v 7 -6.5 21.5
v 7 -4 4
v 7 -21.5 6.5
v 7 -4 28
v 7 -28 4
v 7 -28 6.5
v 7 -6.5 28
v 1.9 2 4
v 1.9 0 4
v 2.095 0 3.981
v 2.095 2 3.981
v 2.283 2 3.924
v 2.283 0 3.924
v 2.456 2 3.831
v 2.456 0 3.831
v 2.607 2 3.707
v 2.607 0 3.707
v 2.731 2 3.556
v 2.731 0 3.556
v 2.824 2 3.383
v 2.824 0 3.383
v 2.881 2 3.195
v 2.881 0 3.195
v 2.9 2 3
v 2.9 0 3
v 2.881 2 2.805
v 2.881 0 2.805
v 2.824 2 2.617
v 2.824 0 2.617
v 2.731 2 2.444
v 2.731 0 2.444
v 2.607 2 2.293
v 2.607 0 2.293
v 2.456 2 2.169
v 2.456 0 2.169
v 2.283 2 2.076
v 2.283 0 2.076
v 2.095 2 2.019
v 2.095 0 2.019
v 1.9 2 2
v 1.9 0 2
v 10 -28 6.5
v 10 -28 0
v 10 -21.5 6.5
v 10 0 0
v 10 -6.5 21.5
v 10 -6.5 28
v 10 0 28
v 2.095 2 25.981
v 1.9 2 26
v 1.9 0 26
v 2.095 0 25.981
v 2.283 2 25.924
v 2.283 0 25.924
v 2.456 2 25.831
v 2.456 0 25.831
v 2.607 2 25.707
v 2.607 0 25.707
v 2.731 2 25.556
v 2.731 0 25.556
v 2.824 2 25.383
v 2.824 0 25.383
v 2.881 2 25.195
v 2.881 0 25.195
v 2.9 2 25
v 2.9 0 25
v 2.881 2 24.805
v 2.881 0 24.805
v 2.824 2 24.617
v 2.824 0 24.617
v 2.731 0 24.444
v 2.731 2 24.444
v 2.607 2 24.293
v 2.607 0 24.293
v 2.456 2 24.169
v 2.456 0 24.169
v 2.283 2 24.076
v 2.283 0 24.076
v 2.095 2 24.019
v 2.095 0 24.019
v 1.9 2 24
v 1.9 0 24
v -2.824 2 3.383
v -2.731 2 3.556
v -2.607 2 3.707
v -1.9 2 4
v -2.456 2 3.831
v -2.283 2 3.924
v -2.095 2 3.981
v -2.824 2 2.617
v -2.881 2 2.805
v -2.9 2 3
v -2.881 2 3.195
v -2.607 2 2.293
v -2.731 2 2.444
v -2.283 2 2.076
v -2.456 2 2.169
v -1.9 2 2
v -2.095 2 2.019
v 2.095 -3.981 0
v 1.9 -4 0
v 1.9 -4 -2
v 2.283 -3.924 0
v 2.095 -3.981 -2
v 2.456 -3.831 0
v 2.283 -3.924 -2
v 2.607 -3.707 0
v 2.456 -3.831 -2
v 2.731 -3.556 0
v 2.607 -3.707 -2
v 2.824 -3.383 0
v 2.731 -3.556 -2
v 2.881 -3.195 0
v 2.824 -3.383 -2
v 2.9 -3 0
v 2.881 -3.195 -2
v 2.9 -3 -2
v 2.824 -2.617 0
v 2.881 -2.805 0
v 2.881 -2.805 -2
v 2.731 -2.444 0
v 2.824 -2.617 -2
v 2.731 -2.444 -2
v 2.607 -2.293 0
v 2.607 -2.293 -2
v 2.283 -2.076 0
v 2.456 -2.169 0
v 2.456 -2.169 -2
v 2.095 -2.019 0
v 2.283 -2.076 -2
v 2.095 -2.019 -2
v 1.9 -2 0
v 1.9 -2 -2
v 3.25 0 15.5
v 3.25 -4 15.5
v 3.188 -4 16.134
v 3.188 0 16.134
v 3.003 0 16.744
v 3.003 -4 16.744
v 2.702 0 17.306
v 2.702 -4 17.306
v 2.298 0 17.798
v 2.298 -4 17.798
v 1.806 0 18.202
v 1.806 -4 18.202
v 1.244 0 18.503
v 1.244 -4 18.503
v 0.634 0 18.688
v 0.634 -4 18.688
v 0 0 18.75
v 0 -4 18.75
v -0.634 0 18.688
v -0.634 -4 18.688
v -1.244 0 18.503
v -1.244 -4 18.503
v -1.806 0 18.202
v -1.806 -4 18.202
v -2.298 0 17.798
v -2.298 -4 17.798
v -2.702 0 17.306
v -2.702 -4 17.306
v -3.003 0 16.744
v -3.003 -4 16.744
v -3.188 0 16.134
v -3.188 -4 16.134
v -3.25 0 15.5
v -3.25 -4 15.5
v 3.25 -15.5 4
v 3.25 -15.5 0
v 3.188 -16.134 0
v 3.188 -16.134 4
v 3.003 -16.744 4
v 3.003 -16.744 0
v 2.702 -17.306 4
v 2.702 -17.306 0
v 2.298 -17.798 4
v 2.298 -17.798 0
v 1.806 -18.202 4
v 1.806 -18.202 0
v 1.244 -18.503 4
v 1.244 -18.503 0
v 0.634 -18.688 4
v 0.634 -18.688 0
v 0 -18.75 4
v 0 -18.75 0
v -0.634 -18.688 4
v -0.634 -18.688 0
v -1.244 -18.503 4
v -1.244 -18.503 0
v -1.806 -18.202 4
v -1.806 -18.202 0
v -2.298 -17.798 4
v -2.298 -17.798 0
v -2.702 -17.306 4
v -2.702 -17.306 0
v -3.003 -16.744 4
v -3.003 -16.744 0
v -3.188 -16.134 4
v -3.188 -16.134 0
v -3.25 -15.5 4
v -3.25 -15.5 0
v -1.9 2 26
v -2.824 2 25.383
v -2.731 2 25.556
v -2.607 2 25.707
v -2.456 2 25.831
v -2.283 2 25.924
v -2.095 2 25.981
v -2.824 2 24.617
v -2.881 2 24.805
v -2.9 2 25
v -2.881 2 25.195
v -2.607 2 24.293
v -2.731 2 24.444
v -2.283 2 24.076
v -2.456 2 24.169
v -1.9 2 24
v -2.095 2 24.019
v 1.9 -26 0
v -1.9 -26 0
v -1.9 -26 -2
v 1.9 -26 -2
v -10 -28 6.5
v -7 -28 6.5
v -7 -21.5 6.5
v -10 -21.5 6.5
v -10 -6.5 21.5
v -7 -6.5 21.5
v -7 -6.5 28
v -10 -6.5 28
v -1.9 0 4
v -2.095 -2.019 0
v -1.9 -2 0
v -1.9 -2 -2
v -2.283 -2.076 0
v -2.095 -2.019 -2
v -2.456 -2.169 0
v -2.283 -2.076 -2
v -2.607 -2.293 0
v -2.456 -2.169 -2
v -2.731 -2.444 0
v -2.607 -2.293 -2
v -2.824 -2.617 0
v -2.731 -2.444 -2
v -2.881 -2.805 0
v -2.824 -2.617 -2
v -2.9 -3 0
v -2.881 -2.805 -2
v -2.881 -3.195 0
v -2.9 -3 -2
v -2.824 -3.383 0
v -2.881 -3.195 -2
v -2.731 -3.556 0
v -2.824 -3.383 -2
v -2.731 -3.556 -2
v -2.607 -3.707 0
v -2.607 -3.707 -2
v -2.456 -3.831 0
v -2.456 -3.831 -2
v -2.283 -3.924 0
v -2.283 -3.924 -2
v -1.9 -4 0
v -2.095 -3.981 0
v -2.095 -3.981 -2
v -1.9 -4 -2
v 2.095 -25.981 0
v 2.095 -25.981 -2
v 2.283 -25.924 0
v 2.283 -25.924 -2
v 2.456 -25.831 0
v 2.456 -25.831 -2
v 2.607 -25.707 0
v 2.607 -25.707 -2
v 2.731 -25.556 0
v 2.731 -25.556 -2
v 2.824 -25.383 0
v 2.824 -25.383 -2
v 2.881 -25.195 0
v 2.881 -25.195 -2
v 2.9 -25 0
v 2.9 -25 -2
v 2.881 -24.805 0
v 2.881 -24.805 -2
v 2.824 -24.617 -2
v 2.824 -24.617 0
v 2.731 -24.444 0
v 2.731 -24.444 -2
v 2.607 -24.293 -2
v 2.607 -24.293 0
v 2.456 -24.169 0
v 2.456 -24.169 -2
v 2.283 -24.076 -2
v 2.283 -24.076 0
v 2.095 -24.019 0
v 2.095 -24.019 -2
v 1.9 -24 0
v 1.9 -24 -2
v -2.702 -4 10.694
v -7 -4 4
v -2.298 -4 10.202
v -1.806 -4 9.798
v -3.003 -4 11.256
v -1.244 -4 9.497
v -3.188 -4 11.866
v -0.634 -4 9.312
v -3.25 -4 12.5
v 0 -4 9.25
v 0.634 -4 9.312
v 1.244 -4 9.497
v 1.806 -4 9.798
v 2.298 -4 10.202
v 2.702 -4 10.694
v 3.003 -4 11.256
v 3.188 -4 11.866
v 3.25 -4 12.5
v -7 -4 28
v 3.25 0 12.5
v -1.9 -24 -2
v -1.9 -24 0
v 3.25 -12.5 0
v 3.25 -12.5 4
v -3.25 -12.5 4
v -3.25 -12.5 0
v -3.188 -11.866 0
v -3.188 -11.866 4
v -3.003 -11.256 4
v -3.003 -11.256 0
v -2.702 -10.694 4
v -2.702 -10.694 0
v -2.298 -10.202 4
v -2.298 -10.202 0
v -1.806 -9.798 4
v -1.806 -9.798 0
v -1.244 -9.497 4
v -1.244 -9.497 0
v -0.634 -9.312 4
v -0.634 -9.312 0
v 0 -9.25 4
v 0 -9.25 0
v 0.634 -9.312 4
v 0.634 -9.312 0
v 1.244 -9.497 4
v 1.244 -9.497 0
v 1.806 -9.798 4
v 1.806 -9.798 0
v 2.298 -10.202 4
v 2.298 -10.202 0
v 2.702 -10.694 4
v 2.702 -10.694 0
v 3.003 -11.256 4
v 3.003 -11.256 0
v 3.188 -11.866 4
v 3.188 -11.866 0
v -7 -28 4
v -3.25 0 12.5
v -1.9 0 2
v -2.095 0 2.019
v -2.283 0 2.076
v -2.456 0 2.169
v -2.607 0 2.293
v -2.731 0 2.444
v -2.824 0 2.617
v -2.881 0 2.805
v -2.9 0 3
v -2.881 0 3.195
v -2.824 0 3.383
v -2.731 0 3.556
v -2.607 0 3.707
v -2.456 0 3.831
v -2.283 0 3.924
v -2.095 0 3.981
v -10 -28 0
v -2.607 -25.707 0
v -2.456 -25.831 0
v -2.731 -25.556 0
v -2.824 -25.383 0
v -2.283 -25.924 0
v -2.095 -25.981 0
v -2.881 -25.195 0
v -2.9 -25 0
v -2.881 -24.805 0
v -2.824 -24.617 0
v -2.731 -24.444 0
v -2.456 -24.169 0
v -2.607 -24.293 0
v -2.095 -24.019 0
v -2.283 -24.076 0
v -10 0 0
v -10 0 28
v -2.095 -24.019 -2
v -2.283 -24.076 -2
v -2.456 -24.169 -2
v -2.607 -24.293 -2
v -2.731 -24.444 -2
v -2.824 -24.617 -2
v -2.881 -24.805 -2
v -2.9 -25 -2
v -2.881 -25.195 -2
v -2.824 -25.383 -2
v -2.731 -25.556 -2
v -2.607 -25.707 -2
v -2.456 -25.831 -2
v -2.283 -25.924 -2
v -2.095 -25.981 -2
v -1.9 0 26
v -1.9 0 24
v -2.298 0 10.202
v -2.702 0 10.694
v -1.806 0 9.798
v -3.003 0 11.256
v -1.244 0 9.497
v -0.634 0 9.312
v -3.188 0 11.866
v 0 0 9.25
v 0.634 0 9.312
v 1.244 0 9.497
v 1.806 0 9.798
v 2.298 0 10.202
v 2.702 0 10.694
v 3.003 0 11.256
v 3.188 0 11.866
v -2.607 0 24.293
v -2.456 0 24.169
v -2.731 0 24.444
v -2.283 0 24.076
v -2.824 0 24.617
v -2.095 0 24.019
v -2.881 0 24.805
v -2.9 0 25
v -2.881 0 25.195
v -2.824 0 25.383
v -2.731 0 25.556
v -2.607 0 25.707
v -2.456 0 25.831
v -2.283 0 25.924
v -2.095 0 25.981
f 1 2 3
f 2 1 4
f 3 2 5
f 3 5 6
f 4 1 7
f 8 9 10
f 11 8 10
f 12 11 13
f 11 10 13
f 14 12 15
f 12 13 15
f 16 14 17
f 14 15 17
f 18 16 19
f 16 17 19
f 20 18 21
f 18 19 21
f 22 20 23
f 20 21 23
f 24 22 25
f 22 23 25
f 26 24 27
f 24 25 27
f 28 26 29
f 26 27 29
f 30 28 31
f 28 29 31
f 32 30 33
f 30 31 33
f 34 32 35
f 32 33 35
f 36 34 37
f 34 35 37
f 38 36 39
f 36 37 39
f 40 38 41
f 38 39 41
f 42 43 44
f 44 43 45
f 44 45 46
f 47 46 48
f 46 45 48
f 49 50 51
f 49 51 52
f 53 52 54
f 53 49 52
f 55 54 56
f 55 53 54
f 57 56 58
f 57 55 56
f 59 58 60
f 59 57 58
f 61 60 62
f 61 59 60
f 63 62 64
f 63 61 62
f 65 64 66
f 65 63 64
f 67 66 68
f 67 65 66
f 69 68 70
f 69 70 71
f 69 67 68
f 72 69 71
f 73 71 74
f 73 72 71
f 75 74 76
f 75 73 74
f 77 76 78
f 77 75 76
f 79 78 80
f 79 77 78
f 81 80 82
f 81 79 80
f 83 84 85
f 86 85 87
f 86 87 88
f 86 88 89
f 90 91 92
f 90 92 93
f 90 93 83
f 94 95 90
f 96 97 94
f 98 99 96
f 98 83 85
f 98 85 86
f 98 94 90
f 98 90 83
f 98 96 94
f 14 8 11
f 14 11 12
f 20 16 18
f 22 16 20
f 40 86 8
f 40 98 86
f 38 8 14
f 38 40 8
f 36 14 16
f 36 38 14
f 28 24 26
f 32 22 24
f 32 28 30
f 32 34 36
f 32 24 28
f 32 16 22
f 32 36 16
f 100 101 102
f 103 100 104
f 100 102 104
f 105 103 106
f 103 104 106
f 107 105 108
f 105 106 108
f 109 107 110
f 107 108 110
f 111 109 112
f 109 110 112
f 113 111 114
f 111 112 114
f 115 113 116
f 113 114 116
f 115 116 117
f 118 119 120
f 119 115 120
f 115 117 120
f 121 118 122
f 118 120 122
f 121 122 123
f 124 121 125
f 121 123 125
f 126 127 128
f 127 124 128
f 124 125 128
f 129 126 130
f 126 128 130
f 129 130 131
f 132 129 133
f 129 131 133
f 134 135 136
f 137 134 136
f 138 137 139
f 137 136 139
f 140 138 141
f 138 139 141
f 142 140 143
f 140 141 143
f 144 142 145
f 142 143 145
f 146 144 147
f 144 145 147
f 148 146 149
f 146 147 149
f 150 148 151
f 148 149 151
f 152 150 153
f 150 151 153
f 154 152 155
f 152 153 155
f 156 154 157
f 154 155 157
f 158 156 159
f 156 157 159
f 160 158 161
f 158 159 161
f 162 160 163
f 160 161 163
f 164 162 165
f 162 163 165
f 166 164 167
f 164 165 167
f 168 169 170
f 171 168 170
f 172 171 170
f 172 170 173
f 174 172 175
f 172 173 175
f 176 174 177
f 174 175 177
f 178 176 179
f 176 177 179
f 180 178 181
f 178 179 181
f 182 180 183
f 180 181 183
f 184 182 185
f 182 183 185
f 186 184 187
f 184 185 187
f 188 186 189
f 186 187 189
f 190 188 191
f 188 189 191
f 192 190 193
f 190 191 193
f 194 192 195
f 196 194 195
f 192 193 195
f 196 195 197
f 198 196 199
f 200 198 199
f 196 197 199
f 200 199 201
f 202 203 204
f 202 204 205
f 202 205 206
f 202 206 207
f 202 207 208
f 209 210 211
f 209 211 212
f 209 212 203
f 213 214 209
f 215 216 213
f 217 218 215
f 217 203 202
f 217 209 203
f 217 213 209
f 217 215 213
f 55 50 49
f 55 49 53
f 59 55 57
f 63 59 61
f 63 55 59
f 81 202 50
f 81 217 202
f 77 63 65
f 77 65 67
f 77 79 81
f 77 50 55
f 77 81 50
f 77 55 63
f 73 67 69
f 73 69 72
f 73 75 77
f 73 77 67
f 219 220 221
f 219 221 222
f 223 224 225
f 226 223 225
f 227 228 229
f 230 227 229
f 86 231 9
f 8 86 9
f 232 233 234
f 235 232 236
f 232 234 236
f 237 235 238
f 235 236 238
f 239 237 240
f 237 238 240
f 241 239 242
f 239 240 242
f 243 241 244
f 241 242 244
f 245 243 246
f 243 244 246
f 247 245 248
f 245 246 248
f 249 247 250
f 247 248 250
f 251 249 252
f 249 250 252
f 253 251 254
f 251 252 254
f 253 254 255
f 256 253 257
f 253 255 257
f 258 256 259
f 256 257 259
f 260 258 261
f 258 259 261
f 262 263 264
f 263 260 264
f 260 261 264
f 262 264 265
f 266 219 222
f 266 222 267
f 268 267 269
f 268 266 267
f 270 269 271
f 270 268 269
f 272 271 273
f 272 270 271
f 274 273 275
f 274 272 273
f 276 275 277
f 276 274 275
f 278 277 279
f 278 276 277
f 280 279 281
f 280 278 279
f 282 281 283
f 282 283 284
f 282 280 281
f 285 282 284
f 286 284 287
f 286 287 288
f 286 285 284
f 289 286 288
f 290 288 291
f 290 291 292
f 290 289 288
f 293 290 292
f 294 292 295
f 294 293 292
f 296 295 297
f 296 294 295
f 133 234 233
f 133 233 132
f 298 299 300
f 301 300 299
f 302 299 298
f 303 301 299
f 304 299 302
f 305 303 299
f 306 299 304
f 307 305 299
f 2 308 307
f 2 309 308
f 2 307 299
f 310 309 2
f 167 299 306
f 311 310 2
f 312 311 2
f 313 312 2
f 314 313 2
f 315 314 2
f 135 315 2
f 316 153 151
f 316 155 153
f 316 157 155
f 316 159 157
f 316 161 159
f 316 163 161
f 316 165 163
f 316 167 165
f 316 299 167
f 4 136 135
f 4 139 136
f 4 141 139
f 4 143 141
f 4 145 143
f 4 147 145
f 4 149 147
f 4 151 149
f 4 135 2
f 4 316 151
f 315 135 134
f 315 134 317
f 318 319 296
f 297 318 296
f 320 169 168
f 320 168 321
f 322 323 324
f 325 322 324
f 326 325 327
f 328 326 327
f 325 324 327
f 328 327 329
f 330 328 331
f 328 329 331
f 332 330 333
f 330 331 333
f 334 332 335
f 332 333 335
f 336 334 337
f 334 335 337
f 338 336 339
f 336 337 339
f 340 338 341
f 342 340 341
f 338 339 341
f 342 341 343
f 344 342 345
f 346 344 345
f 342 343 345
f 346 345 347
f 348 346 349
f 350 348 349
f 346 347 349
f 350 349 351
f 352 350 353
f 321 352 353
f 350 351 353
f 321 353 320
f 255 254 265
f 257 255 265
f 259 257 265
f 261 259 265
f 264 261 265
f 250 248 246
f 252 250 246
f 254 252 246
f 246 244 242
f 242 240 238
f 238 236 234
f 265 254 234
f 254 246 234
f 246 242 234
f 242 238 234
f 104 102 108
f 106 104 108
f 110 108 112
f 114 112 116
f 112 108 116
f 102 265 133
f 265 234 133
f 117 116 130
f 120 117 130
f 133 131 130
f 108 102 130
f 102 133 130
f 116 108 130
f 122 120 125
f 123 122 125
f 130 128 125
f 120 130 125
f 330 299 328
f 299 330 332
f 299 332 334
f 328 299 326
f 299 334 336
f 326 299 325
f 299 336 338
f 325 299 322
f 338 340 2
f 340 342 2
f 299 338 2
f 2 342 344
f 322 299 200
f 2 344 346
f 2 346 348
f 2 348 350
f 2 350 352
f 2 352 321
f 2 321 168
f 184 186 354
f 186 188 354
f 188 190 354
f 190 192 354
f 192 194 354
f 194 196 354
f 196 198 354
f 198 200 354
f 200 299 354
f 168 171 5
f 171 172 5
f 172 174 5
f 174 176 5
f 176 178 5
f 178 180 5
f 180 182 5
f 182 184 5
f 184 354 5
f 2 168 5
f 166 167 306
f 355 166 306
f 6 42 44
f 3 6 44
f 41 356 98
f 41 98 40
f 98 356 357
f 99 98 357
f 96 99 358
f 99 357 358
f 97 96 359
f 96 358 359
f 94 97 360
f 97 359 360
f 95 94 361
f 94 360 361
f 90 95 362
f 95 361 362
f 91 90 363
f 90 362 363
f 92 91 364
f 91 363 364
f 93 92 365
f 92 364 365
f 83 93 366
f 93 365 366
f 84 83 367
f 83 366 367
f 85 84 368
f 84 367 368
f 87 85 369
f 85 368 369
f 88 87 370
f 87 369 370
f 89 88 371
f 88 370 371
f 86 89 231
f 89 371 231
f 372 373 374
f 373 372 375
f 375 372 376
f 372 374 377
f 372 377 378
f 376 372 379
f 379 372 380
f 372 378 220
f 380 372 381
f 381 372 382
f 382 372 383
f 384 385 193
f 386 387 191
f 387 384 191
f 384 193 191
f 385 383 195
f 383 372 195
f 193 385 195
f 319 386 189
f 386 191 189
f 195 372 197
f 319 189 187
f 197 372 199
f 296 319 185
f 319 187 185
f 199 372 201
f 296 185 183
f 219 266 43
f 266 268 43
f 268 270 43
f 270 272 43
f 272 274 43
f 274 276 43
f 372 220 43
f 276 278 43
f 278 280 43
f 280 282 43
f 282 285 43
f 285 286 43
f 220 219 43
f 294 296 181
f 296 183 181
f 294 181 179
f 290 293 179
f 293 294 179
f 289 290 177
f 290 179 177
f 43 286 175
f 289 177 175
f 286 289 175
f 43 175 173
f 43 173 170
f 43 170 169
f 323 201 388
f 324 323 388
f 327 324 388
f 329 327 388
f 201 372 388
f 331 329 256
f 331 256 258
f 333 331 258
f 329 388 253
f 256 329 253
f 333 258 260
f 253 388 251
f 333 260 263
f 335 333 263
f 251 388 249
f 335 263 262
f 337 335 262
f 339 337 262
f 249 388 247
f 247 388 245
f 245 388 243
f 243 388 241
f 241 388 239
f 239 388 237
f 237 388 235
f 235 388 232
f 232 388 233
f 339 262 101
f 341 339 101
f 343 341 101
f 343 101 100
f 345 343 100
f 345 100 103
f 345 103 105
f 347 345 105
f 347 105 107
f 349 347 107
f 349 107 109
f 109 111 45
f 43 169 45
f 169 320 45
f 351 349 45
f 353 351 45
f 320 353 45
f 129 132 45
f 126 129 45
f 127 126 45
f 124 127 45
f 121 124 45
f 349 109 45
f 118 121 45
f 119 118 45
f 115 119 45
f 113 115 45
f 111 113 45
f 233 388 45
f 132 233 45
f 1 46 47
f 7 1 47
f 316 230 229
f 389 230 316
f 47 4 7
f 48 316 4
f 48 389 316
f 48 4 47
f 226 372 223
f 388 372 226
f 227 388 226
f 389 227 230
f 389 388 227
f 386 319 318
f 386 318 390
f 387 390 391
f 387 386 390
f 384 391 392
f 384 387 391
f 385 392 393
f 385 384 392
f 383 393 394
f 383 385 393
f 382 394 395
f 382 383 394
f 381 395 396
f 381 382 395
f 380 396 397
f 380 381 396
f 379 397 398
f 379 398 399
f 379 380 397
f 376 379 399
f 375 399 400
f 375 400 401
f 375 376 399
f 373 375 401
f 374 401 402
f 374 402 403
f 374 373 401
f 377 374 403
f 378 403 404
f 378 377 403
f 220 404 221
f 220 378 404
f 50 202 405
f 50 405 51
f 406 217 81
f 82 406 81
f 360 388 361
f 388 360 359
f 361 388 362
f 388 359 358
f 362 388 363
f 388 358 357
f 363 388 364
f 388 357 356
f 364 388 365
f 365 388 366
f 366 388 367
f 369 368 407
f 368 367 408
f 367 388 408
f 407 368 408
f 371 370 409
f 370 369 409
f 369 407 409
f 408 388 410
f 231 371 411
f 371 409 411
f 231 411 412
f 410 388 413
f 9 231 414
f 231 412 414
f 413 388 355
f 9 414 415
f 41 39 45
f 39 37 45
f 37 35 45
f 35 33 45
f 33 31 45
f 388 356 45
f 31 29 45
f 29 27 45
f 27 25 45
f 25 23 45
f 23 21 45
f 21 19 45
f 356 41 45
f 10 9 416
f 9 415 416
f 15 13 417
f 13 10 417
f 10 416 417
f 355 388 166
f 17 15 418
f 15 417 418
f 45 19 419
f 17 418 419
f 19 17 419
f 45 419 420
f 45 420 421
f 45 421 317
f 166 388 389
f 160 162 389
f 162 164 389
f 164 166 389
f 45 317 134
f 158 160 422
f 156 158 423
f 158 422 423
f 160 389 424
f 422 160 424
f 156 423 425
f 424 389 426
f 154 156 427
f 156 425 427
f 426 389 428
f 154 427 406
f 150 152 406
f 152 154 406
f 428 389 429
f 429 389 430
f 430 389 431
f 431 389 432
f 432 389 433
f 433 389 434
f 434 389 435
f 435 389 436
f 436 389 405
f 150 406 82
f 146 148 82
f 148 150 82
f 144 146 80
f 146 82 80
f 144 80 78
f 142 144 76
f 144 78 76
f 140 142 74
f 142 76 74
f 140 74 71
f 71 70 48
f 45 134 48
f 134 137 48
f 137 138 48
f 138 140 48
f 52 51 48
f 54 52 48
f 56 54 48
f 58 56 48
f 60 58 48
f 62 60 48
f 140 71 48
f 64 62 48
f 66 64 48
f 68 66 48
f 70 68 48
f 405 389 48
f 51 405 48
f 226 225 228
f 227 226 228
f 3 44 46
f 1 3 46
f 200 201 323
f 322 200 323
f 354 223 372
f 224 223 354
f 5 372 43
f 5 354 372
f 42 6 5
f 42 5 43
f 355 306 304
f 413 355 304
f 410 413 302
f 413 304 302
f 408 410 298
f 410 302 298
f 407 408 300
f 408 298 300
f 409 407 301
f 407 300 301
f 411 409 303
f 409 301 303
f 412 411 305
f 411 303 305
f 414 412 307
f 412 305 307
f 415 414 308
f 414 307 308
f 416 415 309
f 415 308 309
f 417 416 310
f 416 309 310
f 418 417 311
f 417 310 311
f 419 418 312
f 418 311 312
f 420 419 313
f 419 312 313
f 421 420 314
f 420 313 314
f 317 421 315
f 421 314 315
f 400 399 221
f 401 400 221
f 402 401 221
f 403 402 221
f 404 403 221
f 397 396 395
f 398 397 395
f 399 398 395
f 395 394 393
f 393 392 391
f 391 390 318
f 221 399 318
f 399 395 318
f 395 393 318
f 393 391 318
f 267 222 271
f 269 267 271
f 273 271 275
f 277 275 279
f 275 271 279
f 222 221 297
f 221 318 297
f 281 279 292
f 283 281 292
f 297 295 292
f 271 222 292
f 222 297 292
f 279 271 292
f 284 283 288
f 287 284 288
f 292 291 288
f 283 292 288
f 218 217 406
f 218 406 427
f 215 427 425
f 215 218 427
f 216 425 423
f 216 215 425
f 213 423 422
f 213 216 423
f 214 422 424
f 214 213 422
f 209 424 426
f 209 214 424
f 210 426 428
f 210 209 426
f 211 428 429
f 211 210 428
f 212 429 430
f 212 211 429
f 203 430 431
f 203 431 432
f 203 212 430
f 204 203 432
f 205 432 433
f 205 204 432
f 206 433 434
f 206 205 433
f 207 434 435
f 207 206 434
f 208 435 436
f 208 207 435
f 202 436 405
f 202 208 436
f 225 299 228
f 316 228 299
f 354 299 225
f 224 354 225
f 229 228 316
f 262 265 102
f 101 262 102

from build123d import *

# Parameters (mm, degrees)
SKETCH_W              = 20
SKETCH_H              = 28
PAD_DEPTH             = 28
SKETCH001_W           = 14
SKETCH001_H           = 24
POCKET_DEPTH          = 24
POCKET001_DEPTH       = 20.001
POCKET002_DEPTH       = 92.725292
POLARPATTERN_COUNT    = 2
POLARPATTERN_ANGLE    = 90
PAD001_DEPTH          = 2
POLARPATTERN001_COUNT = 2
POLARPATTERN001_ANGLE = 90


with BuildPart() as part:
    # Sketch → Pad (new body)
    with BuildSketch(Plane.XZ):
        with Locations((0, 14)):
            Rectangle(SKETCH_W, SKETCH_H)
    extrude(amount=PAD_DEPTH)

    # Sketch001 (on Face6 of Pad) → Pocket (cut)
    with BuildSketch(Plane.XZ.offset(28)):
        with Locations((0, 16)):
            Rectangle(SKETCH001_W, SKETCH001_H)
    extrude(amount=-POCKET_DEPTH, mode=Mode.SUBTRACT)

    # Sketch002 (on Face3 of Pocket) → Pocket001 (cut, through all)
    with BuildSketch(Plane(origin=(10, 0, 0), x_dir=(0, 0, 1), z_dir=(1, 0, 0))):
        Polygon((6.5, 28), (6.5, 21.5), (21.5, 6.5), (28, 6.5), (28, 28), align=None)
    extrude(amount=-POCKET001_DEPTH, mode=Mode.SUBTRACT)

    # Sketch003 (on Face16 of Pocket001) → Pocket002 (cut, through all)
    with BuildSketch(Plane.XZ.offset(4)):
        with BuildLine():
            ThreePointArc((3.25, 15.5), (0, 18.75), (-3.25, 15.5))
            Line((-3.25, 15.5), (-3.25, 12.5))
            ThreePointArc((-3.25, 12.5), (0, 9.25), (3.25, 12.5))
            Line((3.25, 15.5), (3.25, 12.5))
        make_face()
    pocket002 = extrude(amount=-POCKET002_DEPTH, mode=Mode.SUBTRACT)

    # PolarPattern: Pocket002 ×2 about axis
    polarpattern_axis = Axis((0, 0, 0), (1, 0, 0))
    for i in range(1, POLARPATTERN_COUNT):
        add(pocket002.rotate(polarpattern_axis, i * POLARPATTERN_ANGLE / (POLARPATTERN_COUNT - 1)), mode=Mode.SUBTRACT)

    # Sketch004 (on Face3 of PolarPattern) → Pad001 (join, symmetric)
    with BuildSketch(Plane(origin=(0, 0, 0), x_dir=(1, 0, 0), z_dir=(0, 1, 0))):
        with BuildLine():
            ThreePointArc((-1.9, -2), (-2.9, -3), (-1.9, -4))
            Line((-1.9, -4), (1.9, -4))
            ThreePointArc((1.9, -4), (2.9, -3), (1.9, -2))
            Line((-1.9, -2), (1.9, -2))
        make_face()
        with BuildLine():
            ThreePointArc((-1.9, -24), (-2.9, -25), (-1.9, -26))
            Line((-1.9, -26), (1.9, -26))
            ThreePointArc((1.9, -26), (2.9, -25), (1.9, -24))
            Line((-1.9, -24), (1.9, -24))
        make_face()
    pad001 = extrude(amount=PAD001_DEPTH, both=True)

    # PolarPattern001: Pad001 ×2 about axis
    polarpattern001_axis = Axis((0, 0, 0), (1, 0, 0))
    for i in range(1, POLARPATTERN001_COUNT):
        add(pad001.rotate(polarpattern001_axis, i * POLARPATTERN001_ANGLE / (POLARPATTERN001_COUNT - 1)))


solid = part.part
